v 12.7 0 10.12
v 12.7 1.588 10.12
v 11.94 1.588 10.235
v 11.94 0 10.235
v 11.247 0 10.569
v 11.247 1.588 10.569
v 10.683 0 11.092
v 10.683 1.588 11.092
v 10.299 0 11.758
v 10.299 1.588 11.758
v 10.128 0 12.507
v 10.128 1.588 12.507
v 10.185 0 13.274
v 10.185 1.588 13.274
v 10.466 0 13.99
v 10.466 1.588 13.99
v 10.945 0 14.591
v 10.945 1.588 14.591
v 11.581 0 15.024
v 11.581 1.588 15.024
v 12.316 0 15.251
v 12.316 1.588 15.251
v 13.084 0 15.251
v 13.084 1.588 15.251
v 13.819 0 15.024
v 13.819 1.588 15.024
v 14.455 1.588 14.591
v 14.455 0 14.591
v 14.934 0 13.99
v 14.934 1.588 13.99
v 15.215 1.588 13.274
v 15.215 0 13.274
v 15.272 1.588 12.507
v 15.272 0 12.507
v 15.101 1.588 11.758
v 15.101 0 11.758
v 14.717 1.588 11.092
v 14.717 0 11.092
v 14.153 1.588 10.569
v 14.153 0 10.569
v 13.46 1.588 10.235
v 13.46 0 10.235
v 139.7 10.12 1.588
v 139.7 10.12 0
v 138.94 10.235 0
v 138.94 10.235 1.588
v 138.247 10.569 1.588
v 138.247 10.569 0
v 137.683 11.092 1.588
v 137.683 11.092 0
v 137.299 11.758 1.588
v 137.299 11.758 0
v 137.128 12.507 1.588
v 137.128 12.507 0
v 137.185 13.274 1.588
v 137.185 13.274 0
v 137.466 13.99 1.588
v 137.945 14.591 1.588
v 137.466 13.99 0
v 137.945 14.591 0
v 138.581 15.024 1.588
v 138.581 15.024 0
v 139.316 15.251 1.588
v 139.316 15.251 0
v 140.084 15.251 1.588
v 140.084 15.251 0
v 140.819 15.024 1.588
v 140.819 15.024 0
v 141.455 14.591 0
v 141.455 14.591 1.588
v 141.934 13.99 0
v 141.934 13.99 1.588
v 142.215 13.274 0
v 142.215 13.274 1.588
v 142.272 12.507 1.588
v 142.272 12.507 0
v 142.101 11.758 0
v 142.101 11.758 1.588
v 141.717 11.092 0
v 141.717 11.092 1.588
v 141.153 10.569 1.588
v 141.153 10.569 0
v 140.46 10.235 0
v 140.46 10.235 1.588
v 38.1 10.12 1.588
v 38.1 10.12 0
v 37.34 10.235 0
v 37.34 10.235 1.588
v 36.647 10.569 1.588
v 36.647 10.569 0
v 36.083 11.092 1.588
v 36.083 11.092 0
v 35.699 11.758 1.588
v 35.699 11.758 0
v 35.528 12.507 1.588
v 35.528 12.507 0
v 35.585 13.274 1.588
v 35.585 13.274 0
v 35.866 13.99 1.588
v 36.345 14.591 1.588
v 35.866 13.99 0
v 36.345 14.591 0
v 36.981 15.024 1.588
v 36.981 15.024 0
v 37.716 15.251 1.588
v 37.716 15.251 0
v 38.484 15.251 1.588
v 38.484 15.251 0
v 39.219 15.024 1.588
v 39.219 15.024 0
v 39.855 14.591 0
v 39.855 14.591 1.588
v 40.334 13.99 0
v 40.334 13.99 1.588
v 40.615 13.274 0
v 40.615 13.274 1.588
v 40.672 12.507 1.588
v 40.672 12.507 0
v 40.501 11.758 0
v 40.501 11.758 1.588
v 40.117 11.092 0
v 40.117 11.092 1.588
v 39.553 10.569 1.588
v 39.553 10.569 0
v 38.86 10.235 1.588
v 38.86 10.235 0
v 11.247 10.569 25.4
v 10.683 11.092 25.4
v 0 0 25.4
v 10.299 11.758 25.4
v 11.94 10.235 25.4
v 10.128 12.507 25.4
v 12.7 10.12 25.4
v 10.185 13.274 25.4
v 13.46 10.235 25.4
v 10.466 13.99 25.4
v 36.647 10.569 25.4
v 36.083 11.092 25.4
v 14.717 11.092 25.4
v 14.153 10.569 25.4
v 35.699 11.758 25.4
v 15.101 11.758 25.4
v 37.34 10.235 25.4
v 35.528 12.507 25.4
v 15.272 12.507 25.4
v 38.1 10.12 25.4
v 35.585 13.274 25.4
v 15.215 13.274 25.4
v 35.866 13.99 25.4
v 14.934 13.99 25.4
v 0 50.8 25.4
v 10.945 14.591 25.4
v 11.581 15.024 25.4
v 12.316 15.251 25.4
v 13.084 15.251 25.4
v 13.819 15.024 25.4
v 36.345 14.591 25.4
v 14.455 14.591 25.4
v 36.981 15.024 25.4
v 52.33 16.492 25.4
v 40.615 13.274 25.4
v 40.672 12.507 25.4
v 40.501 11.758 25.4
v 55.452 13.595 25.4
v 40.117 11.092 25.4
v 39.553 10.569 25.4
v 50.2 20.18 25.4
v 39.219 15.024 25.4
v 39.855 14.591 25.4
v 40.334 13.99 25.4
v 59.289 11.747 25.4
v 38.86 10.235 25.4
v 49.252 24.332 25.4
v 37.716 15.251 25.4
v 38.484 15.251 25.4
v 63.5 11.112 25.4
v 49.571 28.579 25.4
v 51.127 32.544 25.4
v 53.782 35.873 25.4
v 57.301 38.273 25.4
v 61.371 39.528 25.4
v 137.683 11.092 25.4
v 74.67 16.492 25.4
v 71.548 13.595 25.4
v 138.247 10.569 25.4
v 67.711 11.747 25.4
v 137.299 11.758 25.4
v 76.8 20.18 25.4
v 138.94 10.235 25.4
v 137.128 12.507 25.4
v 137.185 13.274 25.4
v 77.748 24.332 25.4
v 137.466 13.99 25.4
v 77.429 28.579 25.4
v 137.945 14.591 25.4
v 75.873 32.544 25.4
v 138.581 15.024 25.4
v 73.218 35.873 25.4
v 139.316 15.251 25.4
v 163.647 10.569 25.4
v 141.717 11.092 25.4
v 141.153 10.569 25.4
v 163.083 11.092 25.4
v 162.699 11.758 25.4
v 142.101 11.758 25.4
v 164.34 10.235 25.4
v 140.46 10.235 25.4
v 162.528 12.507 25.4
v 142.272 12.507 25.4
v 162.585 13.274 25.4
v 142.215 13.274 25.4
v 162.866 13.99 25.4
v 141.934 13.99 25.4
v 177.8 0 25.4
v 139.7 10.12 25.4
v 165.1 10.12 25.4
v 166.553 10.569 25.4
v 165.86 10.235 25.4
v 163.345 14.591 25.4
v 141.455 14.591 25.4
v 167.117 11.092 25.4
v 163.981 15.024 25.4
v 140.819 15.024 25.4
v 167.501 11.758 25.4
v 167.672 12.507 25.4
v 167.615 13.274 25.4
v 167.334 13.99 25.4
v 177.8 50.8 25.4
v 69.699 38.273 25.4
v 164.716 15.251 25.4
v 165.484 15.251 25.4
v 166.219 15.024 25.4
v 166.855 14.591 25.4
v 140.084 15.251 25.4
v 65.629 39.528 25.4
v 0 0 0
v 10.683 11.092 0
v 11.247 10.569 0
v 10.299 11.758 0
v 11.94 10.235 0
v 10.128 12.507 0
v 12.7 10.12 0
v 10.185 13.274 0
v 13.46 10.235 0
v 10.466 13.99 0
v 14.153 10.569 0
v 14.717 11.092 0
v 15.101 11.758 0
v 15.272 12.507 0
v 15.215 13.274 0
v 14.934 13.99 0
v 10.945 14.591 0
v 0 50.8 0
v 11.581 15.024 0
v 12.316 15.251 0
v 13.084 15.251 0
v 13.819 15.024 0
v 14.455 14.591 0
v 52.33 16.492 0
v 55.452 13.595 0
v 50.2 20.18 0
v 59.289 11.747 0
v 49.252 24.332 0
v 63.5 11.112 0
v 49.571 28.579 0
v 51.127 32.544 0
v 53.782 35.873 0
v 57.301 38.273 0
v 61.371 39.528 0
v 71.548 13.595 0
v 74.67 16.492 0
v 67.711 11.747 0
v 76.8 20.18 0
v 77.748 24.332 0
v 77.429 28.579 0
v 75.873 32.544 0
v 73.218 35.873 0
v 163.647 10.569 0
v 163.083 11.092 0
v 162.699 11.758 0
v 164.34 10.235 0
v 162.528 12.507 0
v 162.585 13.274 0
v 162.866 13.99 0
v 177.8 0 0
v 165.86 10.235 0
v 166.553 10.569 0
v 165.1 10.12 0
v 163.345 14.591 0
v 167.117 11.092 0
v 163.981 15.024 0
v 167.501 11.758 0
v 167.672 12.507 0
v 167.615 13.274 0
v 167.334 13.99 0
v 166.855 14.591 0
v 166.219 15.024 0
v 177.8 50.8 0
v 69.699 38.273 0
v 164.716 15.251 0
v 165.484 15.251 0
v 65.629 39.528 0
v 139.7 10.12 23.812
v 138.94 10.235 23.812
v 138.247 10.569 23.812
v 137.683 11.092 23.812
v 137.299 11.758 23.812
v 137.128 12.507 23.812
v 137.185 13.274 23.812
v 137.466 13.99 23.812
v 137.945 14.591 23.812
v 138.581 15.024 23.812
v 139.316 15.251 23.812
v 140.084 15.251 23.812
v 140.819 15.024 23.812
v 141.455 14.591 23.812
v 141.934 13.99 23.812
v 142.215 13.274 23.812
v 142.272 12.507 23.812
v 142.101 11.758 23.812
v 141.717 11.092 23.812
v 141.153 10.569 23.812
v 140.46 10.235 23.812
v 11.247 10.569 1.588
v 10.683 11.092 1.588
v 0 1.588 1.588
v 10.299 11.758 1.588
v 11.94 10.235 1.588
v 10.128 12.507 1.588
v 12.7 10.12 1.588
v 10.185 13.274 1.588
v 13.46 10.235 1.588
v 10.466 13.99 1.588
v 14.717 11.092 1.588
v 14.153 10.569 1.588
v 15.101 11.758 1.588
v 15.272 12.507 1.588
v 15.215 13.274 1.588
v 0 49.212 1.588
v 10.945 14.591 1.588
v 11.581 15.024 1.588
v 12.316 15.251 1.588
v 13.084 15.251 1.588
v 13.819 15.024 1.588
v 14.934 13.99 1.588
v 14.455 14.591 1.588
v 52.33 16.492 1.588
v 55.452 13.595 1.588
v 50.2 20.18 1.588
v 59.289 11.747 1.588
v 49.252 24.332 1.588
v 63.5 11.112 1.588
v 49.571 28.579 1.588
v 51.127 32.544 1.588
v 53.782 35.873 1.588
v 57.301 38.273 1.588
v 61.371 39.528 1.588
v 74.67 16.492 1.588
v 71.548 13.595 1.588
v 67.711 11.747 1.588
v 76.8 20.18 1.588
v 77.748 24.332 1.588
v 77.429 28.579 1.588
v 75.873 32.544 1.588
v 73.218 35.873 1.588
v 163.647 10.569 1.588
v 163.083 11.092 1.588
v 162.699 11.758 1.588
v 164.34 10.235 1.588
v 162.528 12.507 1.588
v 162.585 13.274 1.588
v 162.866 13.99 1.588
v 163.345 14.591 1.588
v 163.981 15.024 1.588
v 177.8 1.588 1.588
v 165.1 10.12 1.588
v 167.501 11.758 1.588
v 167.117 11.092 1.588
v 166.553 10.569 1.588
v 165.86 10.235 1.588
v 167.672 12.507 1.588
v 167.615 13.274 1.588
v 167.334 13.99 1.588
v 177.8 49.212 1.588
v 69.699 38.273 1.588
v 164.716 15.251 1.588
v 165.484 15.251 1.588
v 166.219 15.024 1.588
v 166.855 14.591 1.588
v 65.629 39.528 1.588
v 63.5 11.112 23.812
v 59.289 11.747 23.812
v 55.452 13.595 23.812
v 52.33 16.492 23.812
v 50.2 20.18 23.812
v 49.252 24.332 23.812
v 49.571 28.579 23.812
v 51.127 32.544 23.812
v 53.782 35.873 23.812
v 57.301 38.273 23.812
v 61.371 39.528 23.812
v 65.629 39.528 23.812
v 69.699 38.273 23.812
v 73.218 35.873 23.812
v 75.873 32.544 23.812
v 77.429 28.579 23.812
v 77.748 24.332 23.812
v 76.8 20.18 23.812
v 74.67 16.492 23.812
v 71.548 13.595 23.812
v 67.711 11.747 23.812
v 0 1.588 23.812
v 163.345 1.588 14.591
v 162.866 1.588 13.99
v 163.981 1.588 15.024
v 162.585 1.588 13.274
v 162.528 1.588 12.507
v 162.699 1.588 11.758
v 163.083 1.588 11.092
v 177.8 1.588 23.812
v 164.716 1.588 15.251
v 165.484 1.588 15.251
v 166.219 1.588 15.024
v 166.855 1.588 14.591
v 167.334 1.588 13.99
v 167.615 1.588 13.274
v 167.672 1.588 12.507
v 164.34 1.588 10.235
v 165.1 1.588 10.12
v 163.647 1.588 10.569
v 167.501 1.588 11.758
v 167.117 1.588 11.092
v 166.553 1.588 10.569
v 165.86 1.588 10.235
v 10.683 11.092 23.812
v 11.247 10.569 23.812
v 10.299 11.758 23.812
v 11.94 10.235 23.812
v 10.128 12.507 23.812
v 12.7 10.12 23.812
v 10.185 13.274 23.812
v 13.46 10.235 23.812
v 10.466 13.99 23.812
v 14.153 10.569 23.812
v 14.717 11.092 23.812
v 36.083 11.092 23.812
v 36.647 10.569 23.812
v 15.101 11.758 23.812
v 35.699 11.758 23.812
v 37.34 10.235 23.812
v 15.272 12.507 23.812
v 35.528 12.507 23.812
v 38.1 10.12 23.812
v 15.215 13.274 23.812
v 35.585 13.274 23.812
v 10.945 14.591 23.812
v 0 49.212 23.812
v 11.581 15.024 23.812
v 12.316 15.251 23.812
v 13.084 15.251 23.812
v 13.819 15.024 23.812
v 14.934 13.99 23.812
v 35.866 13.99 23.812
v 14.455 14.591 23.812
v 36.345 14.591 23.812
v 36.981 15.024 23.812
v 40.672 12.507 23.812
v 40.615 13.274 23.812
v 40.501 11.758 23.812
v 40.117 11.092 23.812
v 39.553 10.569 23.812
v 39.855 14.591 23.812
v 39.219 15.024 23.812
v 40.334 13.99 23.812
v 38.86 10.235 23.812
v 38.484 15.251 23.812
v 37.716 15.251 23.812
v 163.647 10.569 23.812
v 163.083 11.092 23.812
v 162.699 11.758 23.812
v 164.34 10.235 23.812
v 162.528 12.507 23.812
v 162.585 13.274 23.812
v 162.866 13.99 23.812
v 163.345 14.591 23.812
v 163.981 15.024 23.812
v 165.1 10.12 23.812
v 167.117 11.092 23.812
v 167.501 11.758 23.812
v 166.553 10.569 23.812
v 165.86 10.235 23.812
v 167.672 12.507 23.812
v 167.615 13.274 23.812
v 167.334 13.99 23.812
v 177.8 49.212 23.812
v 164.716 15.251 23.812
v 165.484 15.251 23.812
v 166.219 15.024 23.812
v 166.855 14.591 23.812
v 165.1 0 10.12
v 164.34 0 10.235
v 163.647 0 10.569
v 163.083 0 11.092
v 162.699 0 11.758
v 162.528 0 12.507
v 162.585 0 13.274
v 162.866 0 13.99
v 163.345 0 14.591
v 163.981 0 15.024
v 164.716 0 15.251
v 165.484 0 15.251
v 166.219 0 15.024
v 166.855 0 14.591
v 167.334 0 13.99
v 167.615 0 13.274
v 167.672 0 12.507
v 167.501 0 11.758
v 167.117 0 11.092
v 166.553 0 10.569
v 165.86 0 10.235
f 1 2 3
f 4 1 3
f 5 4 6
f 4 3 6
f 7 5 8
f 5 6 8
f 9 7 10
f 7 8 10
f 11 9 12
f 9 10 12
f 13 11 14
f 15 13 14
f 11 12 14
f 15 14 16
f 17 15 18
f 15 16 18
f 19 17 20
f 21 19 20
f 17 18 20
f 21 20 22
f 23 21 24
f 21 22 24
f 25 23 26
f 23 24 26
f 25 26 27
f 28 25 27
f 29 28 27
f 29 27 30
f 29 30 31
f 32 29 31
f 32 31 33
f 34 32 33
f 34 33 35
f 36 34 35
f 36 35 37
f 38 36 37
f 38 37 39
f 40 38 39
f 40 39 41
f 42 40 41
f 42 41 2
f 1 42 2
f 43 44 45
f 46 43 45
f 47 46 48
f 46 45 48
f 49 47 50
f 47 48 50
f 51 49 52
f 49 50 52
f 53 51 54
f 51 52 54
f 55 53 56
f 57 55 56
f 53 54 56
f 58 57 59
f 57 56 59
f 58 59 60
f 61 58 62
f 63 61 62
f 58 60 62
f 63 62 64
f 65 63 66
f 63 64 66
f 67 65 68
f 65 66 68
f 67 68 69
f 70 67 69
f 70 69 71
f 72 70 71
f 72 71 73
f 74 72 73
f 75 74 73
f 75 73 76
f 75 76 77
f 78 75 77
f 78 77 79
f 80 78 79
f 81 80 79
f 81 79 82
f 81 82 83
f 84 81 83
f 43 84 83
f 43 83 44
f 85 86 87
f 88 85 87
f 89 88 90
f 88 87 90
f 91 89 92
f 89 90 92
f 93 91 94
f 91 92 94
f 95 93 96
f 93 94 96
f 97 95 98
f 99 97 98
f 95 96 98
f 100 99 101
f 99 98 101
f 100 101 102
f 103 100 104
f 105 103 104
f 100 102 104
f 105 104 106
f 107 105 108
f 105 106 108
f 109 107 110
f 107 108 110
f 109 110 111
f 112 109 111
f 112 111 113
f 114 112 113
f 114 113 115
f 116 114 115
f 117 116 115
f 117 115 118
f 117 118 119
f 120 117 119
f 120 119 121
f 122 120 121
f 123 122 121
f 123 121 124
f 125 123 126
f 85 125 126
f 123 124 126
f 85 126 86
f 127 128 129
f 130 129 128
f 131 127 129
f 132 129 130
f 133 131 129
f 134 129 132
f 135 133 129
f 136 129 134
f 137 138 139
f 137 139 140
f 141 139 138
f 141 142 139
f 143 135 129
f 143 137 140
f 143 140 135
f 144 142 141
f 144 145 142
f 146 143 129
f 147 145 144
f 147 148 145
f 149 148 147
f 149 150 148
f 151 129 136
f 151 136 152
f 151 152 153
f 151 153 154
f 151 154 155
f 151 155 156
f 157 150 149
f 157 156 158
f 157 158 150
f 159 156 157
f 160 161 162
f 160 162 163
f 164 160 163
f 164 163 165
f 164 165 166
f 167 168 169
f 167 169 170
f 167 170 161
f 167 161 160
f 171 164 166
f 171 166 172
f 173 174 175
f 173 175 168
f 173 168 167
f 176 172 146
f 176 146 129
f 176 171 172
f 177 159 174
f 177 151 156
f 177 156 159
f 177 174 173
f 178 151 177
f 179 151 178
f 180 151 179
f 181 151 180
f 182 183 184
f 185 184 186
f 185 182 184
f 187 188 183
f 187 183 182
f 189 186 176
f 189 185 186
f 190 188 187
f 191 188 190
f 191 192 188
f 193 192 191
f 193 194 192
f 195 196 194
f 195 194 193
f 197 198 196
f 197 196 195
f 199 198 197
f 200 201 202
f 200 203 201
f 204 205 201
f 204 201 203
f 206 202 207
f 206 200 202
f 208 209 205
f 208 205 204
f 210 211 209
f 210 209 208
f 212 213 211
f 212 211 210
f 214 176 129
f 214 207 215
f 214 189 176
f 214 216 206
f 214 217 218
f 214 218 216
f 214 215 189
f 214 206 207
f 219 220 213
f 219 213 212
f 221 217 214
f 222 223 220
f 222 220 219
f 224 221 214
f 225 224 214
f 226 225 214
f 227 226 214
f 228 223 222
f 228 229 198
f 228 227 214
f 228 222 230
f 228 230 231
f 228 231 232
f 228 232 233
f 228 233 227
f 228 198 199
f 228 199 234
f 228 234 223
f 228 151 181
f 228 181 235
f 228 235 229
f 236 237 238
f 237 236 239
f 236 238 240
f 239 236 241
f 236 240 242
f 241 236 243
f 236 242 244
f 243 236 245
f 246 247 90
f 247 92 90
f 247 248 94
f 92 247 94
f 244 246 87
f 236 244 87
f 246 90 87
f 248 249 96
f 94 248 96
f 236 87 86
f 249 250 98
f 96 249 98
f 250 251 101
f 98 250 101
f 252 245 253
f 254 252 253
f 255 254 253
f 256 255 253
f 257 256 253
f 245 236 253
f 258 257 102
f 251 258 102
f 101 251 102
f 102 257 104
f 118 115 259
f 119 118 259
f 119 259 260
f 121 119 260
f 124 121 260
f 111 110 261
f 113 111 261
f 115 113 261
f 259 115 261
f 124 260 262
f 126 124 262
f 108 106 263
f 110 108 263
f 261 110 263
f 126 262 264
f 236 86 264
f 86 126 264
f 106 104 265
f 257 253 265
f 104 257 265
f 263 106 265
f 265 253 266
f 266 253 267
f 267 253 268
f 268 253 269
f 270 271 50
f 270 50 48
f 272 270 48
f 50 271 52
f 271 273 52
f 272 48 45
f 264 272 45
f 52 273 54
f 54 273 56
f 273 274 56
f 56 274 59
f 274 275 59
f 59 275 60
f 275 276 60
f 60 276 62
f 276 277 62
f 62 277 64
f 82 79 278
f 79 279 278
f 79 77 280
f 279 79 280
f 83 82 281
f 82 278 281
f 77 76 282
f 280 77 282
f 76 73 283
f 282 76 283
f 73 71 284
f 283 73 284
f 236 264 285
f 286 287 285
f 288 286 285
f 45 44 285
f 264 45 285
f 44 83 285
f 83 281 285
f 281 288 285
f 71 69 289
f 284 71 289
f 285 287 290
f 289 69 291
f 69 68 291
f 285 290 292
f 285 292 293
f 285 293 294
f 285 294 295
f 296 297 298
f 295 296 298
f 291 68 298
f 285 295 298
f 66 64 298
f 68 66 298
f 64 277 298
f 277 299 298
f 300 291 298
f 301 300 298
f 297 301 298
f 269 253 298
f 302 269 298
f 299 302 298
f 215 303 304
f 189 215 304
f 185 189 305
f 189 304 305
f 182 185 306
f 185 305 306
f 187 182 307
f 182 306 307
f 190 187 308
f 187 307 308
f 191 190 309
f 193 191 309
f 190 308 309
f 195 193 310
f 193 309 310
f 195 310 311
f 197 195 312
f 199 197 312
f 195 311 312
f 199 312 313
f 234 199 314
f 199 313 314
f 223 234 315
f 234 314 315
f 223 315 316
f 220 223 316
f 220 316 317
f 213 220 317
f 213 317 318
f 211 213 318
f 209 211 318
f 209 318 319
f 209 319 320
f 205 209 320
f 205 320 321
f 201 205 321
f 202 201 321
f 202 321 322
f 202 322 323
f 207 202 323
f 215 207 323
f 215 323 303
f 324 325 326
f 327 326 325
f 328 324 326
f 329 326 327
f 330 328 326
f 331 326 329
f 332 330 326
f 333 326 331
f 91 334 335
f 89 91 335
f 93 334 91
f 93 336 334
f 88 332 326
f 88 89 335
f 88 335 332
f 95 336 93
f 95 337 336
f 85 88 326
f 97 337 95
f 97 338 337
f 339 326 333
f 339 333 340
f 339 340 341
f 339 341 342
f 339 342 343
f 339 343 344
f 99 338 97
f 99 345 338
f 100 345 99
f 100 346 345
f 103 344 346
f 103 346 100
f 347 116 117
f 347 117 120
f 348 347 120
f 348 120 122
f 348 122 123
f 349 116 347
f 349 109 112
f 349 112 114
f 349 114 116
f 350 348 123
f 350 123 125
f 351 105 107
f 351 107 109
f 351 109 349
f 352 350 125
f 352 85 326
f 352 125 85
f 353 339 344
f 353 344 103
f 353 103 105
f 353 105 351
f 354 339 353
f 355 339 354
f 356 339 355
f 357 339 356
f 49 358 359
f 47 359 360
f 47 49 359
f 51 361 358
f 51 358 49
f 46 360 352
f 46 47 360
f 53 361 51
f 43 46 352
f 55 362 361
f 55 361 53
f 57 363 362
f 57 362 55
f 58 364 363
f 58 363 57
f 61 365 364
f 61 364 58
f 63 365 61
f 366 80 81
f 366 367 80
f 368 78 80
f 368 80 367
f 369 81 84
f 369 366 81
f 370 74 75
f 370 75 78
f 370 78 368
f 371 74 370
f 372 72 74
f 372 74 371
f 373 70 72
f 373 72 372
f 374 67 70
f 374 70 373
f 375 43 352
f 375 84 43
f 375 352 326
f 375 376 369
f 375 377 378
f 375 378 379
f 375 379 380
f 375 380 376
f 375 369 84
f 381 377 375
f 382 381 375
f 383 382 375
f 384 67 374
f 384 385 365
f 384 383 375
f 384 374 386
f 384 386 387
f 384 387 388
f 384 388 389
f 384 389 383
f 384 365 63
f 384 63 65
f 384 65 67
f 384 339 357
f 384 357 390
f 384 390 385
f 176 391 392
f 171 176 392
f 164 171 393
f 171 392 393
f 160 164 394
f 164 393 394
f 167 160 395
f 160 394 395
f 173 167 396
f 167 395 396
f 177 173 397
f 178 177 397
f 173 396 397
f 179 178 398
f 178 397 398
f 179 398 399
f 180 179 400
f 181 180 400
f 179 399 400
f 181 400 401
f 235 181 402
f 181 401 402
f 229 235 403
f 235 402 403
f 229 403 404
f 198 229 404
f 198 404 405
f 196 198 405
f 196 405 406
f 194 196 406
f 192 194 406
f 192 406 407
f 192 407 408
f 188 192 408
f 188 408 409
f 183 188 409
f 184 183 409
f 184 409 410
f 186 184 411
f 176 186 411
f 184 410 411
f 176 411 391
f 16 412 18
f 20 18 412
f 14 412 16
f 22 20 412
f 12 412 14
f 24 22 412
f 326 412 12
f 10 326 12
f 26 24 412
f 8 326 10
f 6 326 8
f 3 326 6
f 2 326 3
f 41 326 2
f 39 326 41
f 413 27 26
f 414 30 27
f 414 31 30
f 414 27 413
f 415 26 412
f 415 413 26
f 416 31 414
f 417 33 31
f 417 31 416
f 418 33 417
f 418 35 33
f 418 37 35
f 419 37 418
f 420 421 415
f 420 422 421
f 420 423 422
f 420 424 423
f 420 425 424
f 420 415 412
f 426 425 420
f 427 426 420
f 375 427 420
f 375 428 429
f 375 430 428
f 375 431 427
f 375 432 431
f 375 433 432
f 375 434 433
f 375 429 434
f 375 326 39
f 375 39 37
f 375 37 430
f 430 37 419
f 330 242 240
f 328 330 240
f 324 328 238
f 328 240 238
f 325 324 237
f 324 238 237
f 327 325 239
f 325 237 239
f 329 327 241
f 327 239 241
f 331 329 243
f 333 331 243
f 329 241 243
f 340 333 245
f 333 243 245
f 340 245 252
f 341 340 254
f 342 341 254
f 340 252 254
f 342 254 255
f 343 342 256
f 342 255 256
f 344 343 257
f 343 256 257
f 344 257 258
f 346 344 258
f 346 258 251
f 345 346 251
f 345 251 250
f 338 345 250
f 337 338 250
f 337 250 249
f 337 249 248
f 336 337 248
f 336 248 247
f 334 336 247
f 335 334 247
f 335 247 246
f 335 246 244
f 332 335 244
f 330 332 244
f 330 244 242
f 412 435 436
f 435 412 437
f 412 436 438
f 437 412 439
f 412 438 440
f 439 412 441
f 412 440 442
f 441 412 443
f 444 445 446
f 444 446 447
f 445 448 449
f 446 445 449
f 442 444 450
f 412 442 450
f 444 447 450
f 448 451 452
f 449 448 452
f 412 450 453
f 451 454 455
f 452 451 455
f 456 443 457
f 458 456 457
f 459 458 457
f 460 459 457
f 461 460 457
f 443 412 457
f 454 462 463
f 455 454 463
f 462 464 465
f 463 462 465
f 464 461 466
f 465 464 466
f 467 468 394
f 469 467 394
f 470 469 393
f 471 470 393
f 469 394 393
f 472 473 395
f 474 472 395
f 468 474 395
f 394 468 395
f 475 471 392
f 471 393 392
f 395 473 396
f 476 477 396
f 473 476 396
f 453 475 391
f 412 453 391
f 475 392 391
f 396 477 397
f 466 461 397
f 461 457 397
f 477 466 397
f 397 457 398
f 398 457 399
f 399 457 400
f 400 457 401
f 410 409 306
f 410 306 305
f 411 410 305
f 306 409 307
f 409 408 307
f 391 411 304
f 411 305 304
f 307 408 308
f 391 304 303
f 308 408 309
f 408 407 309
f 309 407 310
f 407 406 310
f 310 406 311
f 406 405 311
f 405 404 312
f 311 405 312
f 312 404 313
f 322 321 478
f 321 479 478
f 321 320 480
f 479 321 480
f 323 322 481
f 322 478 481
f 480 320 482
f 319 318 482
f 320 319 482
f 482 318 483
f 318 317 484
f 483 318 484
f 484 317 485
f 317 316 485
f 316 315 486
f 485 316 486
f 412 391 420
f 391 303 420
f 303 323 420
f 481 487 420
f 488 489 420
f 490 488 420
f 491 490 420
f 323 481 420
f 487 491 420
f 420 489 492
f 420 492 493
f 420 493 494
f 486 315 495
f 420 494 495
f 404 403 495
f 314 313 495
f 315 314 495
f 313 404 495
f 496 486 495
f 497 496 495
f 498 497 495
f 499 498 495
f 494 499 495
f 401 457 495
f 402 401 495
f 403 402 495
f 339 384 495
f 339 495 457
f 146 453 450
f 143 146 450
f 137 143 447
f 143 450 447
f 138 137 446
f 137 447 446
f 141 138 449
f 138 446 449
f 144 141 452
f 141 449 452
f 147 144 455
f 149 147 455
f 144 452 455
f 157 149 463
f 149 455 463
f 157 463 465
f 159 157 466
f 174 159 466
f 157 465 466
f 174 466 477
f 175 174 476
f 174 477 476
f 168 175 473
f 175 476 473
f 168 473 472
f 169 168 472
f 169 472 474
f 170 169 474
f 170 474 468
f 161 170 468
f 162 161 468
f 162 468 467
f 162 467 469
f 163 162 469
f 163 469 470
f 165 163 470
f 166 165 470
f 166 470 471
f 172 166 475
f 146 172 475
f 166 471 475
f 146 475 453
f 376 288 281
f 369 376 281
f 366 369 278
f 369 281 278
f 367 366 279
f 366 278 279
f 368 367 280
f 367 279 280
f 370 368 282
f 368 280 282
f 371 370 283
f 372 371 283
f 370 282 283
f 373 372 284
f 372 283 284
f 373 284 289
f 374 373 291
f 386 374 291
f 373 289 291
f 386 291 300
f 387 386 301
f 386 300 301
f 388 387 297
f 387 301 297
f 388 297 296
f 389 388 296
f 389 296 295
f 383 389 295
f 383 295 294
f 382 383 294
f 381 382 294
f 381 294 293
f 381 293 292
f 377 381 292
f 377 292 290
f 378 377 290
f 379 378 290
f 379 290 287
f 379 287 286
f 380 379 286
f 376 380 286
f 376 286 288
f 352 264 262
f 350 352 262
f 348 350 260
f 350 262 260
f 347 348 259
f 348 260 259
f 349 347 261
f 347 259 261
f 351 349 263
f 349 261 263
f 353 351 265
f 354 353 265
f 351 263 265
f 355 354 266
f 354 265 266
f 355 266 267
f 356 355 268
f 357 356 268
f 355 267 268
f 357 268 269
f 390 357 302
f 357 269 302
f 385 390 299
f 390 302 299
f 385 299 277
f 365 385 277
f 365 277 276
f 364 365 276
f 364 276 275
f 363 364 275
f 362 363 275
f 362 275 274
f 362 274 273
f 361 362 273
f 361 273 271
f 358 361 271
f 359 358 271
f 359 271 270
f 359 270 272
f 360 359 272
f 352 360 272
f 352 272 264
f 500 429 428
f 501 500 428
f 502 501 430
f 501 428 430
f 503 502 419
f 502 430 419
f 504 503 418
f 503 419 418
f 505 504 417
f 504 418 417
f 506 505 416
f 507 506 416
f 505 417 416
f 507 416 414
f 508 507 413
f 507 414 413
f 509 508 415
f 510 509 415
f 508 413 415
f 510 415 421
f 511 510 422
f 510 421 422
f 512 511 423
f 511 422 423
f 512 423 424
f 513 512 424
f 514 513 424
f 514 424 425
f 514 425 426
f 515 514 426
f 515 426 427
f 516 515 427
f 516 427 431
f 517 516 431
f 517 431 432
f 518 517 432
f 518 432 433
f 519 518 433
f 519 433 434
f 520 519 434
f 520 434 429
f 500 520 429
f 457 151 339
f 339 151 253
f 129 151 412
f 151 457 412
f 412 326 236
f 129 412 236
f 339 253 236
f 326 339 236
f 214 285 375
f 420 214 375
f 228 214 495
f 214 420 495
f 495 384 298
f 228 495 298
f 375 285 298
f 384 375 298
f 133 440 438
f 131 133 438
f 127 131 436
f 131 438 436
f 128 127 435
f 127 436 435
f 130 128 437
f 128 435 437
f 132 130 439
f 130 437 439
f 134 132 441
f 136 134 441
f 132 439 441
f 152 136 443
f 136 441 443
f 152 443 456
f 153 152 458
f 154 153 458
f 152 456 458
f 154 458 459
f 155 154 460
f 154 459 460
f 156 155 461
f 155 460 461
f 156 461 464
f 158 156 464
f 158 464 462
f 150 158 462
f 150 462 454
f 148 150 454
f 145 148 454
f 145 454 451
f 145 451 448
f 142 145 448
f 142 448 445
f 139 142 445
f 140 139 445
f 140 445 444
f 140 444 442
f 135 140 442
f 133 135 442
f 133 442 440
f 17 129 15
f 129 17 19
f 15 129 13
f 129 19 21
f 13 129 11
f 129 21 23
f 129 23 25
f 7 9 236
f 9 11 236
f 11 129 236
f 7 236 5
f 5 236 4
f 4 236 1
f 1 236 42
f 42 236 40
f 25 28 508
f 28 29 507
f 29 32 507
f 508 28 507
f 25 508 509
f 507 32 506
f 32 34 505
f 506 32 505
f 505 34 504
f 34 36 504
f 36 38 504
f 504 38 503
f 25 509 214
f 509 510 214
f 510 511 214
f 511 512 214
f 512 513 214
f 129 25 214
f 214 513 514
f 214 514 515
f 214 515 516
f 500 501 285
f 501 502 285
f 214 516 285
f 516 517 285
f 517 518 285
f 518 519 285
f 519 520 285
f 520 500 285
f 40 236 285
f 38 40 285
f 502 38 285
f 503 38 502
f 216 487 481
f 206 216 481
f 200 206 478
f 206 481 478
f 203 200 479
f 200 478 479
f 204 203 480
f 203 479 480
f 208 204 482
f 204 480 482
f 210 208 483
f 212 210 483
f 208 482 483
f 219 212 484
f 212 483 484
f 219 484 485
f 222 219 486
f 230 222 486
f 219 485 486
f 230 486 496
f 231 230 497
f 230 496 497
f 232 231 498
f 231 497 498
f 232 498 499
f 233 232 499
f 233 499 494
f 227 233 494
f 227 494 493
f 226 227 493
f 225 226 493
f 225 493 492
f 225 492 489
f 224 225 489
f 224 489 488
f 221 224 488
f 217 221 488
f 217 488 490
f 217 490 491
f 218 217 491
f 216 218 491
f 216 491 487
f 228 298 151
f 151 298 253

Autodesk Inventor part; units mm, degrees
ref_plane "YZ Plane" through (0, 0, 0) normal (1, 0, 0) x (0, 1, 0)
ref_plane "XZ Plane" through (0, 0, 0) normal (0, 1, 0) x (-1, 0, 0)
ref_plane "XY Plane" through (0, 0, 0) normal (0, 0, 1) x (1, 0, 0)
sketch "Sketch1" plane through (0, 0, 0) normal (0, 0, 1) x (1, 0, 0)
  line L0 (0, 0) -> (177.8, 0)
  line L1 (177.8, 0) -> (177.8, 50.8)
  line L2 (177.8, 50.8) -> (0, 50.8)
  line L3 (0, 50.8) -> (0, 0)
  dimension "d0" = 177.8
  dimension "d1" = 50.8
extrude "Extrusion1" add sketch "Sketch1" along normal blind 25.4
shell "Shell1" thickness 1.5875 removed faces 2 at (0, 33.8667, 16.9333) at (177.8, 16.9333, 16.9333)
sketch "Sketch2" plane through (0, 0, 25.4) normal (0, 0, 1) x (1, 0, 0)
  line L0 (0, 0) -> (63.5, 0) construction
  line L1 (63.5, 0) -> (63.5, 25.4) construction
  line L2 (63.5, 25.4) -> (0, 25.4) construction
  line L3 (0, 25.4) -> (0, 0) construction
  dimension "d5" = 63.5
  dimension "d13" = 25.4
hole "Hole1" at (63.5, 25.4, 25.4) direction (0, 0, -1) diameter 28.575 end through all
hole "Hole2" at (12.7, 12.7, 25.4) direction (0, 0, -1) diameter 5.1594 end through all
hole "Hole3" at (38.1, 12.7, 25.4) direction (0, 0, -1) diameter 5.1594 end through all
hole "Hole4" at (165.1, 12.7, 25.4) direction (0, 0, -1) diameter 5.1594 end through all
hole "Hole5" at (139.7, 12.7, 25.4) direction (0, 0, -1) diameter 5.1594 end through all
hole "Hole6" at (12.7, 0, 12.7) direction (0, 1, 0) diameter 5.1594 depth 1.5875 tip angle 118
hole "Hole7" at (165.1, 0, 12.7) direction (0, 1, 0) diameter 5.1594 depth 3.175 tip angle 118
properties part number "1x2 5 in Beam Flywheel Mount"
